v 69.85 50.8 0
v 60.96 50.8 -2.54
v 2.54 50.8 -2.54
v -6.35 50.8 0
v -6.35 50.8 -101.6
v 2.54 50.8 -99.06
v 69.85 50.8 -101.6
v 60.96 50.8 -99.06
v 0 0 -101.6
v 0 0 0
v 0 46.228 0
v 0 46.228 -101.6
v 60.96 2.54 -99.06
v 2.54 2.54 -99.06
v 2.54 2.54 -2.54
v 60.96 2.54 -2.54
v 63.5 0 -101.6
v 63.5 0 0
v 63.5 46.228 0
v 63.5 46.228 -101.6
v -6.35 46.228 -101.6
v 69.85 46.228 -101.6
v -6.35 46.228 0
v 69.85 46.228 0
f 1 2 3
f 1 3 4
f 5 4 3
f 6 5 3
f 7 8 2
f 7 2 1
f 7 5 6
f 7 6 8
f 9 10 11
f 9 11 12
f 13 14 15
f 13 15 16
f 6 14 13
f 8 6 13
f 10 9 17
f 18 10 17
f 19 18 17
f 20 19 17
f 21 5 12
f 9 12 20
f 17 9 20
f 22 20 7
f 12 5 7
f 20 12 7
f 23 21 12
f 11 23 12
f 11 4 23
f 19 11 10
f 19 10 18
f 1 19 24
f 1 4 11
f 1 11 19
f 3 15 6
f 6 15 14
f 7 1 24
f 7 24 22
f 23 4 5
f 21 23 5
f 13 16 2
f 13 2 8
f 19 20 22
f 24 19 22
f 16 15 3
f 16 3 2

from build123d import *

# Parameters (mm, degrees)
SKETCH1_W           = 63.5
SKETCH1_H           = 101.6
BOSS_EXTRUDE1_DEPTH = 50.8
SHELL1_T            = -2.54
SKETCH2_W           = 6.35
SKETCH2_H           = 101.6
BOSS_EXTRUDE2_DEPTH = 4.572


with BuildPart() as part:
    # Sketch1 → Boss-Extrude1 (new body)
    with BuildSketch(Plane(origin=(0, 0, 0), x_dir=(1, 0, 0), z_dir=(0, 1, 0))):
        with Locations((31.75, 50.8)):
            Rectangle(SKETCH1_W, SKETCH1_H)
    extrude(amount=BOSS_EXTRUDE1_DEPTH)

    # Shell1
    shell1_openings = [part.faces().sort_by_distance(p)[0] for p in [
        (31.75, 50.8, -50.8),
    ]]
    offset(amount=SHELL1_T, openings=shell1_openings, kind=Kind.INTERSECTION)

    # Sketch2 → Boss-Extrude2 (add)
    with BuildSketch(Plane(origin=(0, 50.8, 0), x_dir=(1, 0, 0), z_dir=(0, 1, 0))):
        with Locations((-3.175, 50.8)):
            Rectangle(SKETCH2_W, SKETCH2_H)
        with Locations((66.675, 50.8)):
            Rectangle(SKETCH2_W, SKETCH2_H)
    extrude(amount=-BOSS_EXTRUDE2_DEPTH)


solid = part.part
